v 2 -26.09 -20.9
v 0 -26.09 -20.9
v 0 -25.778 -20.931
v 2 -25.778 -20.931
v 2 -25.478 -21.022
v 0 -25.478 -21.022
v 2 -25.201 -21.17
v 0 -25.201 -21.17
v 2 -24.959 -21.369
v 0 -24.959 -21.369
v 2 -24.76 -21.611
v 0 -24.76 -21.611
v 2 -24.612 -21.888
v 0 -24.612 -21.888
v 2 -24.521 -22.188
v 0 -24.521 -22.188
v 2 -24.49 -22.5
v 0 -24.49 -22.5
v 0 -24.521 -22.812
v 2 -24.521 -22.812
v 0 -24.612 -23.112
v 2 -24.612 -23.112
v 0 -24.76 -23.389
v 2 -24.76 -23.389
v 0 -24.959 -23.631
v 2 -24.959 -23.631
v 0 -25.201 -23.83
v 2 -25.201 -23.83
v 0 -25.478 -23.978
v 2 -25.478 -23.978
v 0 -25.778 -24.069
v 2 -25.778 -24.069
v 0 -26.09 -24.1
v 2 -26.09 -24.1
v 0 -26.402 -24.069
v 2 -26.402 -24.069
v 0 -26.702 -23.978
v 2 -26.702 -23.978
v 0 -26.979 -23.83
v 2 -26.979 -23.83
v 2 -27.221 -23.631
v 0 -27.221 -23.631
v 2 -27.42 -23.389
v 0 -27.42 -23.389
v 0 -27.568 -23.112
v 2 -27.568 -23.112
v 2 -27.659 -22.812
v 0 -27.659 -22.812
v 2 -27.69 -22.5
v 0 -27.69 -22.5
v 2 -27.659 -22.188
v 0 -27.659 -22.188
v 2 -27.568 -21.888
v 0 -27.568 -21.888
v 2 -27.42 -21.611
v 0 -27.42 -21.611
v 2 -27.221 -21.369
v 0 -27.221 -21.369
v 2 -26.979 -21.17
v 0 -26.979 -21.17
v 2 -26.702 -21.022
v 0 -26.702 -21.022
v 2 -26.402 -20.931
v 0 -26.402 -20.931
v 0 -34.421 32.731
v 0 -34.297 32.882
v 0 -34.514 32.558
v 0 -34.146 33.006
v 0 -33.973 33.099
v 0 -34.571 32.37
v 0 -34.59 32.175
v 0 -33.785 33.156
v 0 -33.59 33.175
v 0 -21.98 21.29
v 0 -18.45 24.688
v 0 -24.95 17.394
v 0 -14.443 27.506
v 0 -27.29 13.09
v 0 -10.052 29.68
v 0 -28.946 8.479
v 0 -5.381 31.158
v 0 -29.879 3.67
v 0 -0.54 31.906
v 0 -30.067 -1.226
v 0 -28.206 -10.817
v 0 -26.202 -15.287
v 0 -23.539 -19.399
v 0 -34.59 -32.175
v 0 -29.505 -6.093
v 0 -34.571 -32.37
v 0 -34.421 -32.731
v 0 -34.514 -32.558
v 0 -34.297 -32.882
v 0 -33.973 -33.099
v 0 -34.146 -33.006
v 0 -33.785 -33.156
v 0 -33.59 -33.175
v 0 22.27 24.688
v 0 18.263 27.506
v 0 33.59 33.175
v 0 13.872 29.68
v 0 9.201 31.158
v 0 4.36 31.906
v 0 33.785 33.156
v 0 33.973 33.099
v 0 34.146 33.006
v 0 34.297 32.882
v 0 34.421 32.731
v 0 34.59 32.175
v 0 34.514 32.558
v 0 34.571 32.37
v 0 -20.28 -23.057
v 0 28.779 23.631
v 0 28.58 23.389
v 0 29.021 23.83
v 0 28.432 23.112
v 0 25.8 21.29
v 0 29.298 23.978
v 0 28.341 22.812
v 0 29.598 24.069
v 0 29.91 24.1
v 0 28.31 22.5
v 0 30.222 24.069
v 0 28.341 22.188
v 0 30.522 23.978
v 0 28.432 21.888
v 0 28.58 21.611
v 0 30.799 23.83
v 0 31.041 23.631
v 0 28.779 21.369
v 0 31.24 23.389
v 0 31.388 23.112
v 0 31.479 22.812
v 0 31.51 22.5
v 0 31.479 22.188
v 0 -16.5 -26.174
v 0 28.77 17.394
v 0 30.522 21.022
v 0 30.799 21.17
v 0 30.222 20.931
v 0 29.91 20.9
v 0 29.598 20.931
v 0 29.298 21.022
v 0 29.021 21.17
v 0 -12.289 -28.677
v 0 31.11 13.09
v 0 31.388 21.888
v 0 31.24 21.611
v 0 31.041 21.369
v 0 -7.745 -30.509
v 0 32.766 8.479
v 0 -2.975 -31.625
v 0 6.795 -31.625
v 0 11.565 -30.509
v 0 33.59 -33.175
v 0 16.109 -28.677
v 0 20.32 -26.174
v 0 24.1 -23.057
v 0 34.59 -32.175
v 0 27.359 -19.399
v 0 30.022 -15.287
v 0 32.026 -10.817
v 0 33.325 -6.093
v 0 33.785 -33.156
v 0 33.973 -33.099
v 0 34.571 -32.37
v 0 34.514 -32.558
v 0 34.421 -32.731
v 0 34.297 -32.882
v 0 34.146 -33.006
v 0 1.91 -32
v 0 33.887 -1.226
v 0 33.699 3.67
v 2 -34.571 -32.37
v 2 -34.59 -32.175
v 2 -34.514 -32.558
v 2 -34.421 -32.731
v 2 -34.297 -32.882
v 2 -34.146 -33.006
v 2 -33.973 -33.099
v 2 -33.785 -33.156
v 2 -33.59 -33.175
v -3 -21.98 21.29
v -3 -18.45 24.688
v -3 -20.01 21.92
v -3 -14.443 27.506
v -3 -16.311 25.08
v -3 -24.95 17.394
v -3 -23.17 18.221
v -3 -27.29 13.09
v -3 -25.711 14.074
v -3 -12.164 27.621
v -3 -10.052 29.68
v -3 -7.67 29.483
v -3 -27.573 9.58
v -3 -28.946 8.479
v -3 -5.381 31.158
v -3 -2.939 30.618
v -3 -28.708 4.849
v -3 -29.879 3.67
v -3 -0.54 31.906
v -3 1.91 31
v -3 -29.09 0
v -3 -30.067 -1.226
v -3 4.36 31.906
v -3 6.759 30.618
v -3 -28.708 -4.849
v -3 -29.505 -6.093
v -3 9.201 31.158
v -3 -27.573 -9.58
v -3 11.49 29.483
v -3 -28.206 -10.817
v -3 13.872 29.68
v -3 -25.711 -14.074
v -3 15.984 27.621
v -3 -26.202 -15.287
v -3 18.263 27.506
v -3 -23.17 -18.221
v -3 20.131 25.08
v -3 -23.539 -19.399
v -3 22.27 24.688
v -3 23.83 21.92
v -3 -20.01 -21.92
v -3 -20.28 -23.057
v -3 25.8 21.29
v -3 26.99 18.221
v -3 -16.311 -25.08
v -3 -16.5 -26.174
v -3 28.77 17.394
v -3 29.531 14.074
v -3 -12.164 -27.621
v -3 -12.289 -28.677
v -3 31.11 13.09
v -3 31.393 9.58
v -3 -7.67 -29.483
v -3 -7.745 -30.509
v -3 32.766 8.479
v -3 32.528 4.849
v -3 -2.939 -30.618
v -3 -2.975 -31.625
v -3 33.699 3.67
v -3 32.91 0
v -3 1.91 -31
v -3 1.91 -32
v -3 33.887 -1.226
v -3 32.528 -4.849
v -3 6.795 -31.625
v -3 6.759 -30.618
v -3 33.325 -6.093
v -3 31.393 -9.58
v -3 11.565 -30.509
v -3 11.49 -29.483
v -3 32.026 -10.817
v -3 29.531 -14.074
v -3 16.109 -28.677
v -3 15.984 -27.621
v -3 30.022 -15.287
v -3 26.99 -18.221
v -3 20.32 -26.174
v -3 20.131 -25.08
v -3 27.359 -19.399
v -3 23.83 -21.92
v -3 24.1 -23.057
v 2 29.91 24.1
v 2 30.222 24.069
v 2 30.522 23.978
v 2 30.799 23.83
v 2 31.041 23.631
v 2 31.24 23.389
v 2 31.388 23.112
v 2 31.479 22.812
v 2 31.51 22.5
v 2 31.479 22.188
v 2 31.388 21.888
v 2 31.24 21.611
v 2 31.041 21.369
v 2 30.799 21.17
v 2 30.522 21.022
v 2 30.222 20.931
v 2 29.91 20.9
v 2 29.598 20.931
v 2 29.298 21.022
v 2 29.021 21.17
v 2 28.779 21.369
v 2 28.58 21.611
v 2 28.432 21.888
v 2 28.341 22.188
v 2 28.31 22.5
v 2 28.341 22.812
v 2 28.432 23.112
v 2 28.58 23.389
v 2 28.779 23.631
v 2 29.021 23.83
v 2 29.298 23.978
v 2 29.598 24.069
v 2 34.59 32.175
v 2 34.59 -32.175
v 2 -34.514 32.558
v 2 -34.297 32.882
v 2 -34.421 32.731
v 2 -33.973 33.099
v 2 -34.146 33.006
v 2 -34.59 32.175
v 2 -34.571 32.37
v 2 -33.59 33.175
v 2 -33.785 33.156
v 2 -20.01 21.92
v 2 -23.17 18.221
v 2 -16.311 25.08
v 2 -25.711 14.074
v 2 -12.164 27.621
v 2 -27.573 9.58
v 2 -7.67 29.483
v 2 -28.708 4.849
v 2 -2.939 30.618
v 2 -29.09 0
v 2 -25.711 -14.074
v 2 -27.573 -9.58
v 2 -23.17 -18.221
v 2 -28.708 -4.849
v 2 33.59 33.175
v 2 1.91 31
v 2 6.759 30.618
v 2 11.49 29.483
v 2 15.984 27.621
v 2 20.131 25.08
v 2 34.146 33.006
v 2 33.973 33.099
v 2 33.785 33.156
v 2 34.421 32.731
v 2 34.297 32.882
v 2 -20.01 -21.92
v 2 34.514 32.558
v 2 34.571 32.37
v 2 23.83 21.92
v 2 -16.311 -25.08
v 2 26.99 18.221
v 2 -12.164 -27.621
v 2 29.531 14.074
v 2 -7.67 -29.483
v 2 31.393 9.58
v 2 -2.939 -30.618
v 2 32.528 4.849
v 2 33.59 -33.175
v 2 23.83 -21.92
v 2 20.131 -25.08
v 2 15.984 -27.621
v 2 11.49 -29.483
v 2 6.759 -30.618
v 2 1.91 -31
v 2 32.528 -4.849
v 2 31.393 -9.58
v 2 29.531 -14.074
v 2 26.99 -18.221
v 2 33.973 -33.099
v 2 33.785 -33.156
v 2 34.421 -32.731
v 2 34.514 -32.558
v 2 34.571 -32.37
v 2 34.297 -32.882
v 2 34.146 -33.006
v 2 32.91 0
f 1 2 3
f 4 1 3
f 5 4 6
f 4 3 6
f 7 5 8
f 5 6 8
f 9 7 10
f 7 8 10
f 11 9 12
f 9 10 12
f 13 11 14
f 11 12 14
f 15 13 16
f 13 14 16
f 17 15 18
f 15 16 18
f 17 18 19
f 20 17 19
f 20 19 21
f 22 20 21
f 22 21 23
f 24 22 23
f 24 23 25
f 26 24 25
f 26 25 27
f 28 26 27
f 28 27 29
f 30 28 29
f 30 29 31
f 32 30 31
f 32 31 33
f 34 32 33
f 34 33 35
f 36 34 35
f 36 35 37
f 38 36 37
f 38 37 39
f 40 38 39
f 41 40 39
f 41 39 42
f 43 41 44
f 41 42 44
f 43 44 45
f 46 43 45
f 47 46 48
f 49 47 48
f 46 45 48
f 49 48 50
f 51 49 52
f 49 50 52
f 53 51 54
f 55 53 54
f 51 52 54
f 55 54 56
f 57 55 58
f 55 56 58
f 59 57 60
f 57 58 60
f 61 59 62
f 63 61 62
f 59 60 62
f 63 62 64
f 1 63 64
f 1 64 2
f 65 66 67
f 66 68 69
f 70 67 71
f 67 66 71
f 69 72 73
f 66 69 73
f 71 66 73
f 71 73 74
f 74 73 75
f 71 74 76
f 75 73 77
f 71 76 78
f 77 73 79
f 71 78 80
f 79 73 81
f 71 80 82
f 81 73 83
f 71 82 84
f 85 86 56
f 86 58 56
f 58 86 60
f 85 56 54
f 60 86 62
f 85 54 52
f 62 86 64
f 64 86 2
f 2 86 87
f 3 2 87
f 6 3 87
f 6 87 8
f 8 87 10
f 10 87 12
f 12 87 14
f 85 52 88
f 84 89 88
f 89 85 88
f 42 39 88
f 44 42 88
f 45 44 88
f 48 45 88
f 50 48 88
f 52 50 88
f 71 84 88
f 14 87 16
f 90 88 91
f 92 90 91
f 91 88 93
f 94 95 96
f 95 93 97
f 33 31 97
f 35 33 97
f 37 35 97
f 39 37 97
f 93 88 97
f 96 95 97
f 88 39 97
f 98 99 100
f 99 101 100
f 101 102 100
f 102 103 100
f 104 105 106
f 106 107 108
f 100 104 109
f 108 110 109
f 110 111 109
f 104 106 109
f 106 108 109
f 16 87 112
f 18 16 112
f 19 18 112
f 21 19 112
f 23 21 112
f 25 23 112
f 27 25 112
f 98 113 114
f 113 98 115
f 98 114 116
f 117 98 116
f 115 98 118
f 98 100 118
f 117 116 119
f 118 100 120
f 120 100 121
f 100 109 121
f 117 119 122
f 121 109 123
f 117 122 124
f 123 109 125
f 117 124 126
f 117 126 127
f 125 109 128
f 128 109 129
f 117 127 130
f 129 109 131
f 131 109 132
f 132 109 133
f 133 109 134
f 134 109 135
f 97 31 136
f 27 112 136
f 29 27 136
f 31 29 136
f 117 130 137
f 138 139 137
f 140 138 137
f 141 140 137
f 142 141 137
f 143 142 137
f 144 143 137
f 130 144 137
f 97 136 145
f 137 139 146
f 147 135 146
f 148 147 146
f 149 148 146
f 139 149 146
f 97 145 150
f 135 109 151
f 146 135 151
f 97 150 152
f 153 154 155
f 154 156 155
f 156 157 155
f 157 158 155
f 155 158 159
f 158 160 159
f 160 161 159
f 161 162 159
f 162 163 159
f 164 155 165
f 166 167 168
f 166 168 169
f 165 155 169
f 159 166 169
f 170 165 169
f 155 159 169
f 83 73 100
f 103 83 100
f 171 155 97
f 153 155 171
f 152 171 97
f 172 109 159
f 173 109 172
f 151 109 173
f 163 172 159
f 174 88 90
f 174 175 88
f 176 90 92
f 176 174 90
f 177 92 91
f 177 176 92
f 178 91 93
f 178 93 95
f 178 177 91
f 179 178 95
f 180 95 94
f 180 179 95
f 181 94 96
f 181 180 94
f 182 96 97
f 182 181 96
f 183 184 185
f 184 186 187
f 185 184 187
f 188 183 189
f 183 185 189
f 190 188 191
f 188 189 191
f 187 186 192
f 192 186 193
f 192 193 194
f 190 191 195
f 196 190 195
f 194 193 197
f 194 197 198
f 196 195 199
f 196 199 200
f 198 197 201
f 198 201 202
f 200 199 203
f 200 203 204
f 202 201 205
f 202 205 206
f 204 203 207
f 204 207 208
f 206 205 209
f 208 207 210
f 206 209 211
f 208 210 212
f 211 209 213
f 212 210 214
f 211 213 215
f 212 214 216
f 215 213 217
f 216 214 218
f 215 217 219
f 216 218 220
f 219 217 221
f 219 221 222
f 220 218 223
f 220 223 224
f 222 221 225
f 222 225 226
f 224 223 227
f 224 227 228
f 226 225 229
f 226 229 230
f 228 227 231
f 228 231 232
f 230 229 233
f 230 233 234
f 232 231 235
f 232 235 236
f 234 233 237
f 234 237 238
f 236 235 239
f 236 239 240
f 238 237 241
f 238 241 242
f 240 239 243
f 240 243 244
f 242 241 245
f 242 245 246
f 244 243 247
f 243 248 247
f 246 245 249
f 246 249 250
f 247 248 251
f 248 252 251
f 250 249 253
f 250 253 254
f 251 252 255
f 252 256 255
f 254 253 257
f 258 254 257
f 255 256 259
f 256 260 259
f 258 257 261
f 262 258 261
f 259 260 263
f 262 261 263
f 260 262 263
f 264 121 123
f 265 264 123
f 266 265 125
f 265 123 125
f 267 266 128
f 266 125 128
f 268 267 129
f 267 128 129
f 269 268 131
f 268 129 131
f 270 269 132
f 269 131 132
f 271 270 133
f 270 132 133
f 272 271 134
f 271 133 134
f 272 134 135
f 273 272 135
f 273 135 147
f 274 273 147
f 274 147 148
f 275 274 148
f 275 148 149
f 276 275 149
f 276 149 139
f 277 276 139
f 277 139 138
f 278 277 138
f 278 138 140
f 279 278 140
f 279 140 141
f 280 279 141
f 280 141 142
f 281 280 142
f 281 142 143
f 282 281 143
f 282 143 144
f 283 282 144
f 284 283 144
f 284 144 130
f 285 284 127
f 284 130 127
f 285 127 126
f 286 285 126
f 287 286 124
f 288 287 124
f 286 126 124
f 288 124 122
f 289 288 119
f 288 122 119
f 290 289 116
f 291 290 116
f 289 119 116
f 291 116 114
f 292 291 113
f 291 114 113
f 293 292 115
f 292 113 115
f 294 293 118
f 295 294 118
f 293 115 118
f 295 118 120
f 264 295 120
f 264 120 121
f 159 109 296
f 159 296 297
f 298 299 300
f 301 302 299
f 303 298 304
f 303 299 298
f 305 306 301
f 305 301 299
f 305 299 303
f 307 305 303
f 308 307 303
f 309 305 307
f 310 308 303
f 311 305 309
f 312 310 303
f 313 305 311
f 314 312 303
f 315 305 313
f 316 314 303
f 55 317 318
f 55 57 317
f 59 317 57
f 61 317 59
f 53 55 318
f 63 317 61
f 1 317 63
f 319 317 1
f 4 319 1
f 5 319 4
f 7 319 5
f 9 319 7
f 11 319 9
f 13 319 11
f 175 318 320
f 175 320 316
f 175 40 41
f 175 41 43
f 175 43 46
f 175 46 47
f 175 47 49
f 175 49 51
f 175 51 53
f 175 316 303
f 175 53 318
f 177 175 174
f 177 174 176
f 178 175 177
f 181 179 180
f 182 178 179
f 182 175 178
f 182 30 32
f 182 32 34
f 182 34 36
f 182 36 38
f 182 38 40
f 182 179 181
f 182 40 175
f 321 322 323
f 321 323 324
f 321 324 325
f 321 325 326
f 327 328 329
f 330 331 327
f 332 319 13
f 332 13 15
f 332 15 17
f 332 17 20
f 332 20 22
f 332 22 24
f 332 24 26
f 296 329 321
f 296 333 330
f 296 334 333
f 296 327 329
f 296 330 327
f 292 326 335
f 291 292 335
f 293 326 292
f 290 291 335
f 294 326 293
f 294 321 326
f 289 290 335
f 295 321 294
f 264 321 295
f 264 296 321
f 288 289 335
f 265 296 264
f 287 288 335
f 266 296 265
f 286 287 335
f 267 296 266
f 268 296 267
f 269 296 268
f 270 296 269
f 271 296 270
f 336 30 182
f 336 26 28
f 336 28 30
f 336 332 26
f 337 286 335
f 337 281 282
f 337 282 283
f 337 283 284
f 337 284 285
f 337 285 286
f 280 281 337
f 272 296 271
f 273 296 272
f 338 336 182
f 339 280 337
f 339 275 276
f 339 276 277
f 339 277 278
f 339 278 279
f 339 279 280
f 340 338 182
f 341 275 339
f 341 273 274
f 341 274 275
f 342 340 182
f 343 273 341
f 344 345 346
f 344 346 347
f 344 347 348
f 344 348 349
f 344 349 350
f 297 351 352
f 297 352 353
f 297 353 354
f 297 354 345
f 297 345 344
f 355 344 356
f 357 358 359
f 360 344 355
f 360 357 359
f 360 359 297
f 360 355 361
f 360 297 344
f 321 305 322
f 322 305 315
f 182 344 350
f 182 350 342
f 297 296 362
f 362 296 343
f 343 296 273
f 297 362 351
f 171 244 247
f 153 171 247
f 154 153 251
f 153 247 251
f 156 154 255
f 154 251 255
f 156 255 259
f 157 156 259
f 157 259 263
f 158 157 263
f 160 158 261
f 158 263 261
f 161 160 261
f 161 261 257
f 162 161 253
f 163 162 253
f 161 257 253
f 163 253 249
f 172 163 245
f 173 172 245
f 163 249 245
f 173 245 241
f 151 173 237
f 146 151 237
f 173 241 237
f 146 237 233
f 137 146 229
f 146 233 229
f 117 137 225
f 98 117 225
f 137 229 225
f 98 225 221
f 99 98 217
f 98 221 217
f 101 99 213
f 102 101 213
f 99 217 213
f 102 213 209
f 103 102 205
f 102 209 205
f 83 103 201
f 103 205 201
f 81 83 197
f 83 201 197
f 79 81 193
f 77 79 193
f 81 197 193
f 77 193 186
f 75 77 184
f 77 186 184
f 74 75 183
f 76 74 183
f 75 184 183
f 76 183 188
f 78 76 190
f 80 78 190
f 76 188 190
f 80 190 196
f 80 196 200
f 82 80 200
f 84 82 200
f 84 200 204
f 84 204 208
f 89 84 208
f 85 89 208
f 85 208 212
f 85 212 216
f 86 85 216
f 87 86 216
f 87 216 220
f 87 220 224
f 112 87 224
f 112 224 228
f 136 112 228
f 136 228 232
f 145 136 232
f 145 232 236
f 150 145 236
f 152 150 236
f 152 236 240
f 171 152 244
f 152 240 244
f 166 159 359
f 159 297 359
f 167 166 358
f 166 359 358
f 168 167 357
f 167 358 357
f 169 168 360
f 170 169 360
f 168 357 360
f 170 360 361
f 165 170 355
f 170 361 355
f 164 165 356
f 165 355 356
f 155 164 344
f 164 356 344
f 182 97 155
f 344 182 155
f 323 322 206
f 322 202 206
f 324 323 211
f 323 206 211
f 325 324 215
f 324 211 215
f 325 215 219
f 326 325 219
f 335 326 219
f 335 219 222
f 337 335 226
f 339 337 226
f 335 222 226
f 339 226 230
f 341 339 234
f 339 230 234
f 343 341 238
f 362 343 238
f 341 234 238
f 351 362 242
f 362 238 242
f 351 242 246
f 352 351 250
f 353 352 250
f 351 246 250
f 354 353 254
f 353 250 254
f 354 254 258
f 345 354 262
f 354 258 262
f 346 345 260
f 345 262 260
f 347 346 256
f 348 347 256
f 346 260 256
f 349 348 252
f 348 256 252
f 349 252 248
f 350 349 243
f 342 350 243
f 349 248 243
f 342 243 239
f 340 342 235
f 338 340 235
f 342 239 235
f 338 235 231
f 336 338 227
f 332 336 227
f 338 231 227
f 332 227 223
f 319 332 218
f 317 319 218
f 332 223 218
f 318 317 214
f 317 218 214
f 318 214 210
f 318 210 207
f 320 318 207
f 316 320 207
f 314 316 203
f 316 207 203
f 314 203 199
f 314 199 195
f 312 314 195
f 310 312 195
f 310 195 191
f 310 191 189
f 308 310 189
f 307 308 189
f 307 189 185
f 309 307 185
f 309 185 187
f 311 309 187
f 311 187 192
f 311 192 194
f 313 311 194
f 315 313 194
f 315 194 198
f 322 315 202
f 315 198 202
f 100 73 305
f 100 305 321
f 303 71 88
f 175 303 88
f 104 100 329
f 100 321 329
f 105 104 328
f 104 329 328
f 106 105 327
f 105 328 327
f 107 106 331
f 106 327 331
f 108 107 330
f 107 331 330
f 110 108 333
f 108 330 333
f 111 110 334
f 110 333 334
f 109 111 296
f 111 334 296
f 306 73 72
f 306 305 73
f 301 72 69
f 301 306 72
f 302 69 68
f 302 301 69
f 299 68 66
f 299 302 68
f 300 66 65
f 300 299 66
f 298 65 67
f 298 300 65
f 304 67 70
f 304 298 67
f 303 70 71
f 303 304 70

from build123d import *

# Parameters (mm, degrees)
SKETCH1_W            = 66.35
SKETCH1_H            = 69.18
BOSS_EXTRUDE1_DEPTH  = 2
SKETCH2_R            = 31
CUT_EXTRUDE1_DEPTH   = 48.969247701
M3_CLEARANCE_HOLE1_D = 3.2
BOSS_EXTRUDE2_START  = -3
SKETCH6_R            = 32
SKETCH6_R_2          = 31
BOSS_EXTRUDE2_DEPTH  = 3
FILLET1_R            = 1


with BuildPart() as part:
    # Sketch1 → Boss-Extrude1 (new body)
    with BuildSketch(Plane(origin=(0, 0, 0), x_dir=(0, 0, -1), z_dir=(1, 0, 0))):
        Rectangle(SKETCH1_W, SKETCH1_H)
    extrude(amount=BOSS_EXTRUDE1_DEPTH)

    # Sketch2 → Cut-Extrude1 (cut, through all)
    with BuildSketch(Plane.ZY):
        with Locations((0, 1.91)):
            Circle(SKETCH2_R)
    extrude(amount=-CUT_EXTRUDE1_DEPTH, mode=Mode.SUBTRACT)

    # M3 Clearance Hole1 (through all)
    with Locations(Plane(origin=(2, 0, 0), x_dir=(0, 0, -1), z_dir=(1, 0, 0))):
        with Locations((-22.5, 29.91), (22.5, -26.09)):
            Hole(M3_CLEARANCE_HOLE1_D / 2)

    # Sketch6 → Boss-Extrude2 (add)
    with BuildSketch(Plane(origin=(0, 0, 0), x_dir=(0, 0, -1), z_dir=(1, 0, 0)).offset(BOSS_EXTRUDE2_START)):
        with Locations((0, 1.91)):
            Circle(SKETCH6_R)
        with Locations(Location((0, 1.91, 0), (0, 0, 180))):
            Circle(SKETCH6_R_2, mode=Mode.SUBTRACT)
    extrude(amount=BOSS_EXTRUDE2_DEPTH)

    # Fillet1
    fillet1_edges = [part.edges().sort_by_distance(p)[0] for p in [
        (1, -34.59, -33.175),
        (1, -34.59, 33.175),
        (1, 34.59, 33.175),
        (1, 34.59, -33.175),
    ]]
    fillet(fillet1_edges, radius=FILLET1_R)


solid = part.part
